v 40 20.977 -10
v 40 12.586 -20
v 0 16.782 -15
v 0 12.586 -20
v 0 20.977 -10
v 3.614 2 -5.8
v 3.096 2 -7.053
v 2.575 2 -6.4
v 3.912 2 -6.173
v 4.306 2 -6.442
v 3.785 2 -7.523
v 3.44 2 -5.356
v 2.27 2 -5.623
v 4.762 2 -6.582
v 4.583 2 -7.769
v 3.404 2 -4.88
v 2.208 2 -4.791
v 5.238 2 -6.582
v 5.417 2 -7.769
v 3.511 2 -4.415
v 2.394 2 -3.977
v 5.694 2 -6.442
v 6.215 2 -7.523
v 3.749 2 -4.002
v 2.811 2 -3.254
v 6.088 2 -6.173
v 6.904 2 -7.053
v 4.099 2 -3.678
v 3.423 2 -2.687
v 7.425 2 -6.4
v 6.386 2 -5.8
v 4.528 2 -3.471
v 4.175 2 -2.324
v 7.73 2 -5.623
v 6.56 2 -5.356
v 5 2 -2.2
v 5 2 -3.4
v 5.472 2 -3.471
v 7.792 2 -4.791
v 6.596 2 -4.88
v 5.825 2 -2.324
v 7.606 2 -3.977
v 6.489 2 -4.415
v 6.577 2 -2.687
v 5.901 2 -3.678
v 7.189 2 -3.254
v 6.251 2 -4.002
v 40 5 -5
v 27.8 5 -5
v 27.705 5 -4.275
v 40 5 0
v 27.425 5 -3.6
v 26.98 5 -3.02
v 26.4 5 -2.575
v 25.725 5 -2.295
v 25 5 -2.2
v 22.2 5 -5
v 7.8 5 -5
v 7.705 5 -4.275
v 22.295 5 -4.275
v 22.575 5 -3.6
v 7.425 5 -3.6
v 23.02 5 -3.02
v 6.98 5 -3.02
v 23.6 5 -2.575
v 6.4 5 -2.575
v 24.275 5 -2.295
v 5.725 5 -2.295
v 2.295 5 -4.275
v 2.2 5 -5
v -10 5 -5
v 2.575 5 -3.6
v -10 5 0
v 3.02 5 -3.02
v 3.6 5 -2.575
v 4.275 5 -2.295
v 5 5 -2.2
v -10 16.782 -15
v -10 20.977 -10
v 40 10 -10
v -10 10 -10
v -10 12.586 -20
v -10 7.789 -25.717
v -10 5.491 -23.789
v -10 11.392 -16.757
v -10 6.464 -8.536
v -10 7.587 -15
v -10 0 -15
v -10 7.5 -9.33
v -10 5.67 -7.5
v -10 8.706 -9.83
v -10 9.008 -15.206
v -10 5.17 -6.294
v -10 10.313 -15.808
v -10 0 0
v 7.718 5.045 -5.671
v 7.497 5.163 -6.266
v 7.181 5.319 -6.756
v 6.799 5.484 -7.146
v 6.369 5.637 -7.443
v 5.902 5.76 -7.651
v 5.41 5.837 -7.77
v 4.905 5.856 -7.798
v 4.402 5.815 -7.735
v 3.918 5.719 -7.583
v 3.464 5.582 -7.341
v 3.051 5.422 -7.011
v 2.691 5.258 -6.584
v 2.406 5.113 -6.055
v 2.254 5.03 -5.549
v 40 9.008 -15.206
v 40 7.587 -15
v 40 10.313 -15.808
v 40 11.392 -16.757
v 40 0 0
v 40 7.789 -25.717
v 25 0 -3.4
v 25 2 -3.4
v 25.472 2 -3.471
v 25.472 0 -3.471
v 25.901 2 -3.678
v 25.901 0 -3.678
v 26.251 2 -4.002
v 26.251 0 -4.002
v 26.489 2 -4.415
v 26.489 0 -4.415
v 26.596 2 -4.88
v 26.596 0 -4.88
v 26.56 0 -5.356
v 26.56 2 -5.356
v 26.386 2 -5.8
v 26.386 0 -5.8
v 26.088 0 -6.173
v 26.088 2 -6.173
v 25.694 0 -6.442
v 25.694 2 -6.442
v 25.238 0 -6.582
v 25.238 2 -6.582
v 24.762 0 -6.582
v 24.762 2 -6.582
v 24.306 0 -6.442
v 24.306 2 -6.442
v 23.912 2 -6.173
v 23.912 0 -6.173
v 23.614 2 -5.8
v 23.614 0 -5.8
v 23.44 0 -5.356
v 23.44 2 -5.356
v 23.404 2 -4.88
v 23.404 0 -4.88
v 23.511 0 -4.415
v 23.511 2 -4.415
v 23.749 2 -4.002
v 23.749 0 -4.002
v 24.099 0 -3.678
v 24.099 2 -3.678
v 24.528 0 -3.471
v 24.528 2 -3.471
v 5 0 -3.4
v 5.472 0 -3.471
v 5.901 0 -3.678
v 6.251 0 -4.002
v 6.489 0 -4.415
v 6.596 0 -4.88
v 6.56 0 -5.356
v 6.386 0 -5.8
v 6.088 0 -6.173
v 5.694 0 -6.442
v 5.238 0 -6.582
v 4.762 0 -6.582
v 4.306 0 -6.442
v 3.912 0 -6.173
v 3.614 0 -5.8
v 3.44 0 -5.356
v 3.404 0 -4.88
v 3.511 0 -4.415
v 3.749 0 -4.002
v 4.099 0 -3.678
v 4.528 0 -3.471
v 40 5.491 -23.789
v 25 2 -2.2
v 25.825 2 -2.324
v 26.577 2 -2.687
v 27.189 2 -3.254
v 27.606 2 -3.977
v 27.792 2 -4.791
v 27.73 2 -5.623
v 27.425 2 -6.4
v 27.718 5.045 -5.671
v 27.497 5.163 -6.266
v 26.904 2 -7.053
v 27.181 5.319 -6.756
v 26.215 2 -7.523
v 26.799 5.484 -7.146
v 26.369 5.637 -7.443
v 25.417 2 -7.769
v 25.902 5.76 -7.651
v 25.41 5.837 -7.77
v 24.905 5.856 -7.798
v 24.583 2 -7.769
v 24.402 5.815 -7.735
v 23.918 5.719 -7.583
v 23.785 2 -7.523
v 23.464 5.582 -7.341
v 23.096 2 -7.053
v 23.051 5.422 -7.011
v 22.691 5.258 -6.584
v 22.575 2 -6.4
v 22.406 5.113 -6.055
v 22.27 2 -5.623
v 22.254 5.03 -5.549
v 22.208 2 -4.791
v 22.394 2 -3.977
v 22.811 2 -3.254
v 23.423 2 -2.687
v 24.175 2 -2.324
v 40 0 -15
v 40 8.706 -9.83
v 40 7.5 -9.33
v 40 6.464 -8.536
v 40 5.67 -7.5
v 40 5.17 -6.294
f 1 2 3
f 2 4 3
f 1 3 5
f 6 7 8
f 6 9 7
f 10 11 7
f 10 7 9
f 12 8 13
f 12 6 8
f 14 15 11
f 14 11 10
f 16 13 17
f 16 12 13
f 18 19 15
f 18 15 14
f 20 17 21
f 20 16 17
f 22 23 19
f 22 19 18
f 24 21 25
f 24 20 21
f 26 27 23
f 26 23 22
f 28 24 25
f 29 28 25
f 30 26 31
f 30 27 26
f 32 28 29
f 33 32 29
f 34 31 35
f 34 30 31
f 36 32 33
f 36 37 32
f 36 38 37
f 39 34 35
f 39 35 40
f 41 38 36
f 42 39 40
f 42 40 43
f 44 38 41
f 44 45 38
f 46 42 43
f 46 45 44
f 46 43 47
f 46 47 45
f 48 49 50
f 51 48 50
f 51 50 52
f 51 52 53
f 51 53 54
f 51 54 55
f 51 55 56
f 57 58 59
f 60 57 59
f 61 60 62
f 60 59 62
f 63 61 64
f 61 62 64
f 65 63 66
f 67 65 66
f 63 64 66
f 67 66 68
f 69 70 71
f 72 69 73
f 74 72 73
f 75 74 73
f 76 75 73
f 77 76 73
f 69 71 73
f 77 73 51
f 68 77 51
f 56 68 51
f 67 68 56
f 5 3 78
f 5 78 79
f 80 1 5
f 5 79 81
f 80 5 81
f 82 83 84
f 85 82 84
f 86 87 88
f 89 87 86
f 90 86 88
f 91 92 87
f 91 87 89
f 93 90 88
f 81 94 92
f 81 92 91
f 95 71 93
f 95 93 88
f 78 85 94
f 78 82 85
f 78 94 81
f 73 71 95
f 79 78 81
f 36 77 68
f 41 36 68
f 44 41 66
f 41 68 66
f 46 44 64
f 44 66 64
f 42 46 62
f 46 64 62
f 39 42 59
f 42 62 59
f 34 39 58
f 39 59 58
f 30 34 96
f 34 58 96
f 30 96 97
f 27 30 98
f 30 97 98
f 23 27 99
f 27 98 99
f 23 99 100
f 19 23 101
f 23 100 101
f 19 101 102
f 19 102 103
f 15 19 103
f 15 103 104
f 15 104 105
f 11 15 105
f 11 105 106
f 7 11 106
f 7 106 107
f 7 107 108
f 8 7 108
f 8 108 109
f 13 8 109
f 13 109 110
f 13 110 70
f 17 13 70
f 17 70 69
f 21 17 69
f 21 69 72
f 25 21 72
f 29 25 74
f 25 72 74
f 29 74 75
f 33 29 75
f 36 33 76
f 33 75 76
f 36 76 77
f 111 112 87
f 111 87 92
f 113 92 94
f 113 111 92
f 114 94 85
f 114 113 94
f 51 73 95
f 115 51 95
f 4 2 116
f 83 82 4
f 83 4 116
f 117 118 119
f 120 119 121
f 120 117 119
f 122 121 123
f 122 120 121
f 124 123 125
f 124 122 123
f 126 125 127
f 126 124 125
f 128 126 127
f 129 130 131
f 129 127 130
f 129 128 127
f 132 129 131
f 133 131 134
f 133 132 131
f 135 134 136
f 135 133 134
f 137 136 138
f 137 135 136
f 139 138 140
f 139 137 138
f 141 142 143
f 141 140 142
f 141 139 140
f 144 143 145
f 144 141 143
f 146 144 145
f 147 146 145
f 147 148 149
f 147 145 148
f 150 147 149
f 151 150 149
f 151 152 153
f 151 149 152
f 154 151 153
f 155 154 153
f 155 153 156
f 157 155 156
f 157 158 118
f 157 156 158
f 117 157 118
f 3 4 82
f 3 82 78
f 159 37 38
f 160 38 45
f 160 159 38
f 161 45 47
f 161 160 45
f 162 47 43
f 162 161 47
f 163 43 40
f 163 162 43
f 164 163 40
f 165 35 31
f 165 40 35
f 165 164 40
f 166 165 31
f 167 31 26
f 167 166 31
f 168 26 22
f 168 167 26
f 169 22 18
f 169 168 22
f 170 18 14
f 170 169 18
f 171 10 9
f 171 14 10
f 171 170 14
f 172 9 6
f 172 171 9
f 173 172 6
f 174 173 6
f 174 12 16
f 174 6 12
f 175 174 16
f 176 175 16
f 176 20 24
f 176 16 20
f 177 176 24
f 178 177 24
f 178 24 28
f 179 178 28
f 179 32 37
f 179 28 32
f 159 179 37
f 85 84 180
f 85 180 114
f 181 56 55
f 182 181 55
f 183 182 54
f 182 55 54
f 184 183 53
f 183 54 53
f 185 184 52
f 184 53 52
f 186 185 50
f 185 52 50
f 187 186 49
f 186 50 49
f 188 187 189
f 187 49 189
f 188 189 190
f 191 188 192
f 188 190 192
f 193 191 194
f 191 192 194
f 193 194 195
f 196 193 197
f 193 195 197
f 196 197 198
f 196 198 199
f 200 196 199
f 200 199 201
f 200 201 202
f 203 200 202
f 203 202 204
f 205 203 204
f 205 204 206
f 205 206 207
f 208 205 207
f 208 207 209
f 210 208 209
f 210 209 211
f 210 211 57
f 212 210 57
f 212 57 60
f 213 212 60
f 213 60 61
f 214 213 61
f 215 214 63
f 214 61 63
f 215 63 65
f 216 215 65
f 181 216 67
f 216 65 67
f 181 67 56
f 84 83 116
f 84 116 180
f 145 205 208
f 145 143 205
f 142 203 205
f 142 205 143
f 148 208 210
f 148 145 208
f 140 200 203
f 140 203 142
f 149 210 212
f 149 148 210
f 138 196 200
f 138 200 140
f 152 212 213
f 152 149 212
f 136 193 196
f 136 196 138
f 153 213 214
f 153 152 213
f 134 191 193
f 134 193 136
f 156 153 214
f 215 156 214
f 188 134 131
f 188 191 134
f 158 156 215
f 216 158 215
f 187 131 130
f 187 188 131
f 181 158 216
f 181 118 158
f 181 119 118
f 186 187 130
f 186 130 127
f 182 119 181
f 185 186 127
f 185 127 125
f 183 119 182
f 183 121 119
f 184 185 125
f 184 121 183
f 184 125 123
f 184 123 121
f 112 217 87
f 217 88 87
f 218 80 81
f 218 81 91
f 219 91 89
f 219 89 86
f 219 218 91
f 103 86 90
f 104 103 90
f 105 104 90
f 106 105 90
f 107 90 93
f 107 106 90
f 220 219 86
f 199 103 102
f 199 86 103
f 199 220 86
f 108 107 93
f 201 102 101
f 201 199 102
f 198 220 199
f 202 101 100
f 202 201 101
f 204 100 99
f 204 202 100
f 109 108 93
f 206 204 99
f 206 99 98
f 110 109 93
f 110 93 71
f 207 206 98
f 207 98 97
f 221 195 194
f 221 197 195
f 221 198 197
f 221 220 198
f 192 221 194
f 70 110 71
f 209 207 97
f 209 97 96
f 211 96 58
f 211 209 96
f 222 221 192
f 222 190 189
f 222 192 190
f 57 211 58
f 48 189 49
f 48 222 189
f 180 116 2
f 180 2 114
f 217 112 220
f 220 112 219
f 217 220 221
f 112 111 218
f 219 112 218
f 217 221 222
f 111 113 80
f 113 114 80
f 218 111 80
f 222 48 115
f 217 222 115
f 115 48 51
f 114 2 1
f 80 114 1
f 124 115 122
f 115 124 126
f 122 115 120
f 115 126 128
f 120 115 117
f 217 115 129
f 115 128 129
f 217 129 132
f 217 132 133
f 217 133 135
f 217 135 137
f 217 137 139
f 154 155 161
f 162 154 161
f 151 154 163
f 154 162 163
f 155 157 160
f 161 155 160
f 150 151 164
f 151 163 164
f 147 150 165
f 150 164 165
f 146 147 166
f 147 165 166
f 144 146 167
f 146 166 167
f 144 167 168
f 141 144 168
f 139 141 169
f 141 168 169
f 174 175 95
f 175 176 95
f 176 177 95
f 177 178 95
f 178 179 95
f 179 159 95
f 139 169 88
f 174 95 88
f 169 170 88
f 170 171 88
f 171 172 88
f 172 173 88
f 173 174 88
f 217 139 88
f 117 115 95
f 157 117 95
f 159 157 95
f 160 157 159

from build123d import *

# Parameters (mm, degrees)
CROQUIS1_W              = 30
CROQUIS1_H              = 10
CROQUIS1_R              = 1.6
SALIENTE_EXTRUIR1_DEPTH = 5
CROQUIS2_R              = 2.8
CORTAR_EXTRUIR1_DEPTH   = 3
SALIENTE_EXTRUIR5_DEPTH = 10
SALIENTE_EXTRUIR6_DEPTH = 30
SALIENTE_EXTRUIR7_DEPTH = 10
REDONDEO1_R             = 5
REDONDEO2_R             = 5
SALIENTE_EXTRUIR8_DEPTH = 50


# Some blends are built 0.0001 mm under size
with BuildPart() as part:
    # Croquis1 → Saliente-Extruir1 (new body)
    with BuildSketch(Plane(origin=(0, 0, 0), x_dir=(1, 0, 0), z_dir=(0, 1, 0))):
        with Locations((15, 5)):
            Rectangle(CROQUIS1_W, CROQUIS1_H)
        with Locations(Location((5, 5, 0), (0, 0, 270))):
            Circle(CROQUIS1_R, mode=Mode.SUBTRACT)
        with Locations(Location((25, 5, 0), (0, 0, 270))):
            Circle(CROQUIS1_R, mode=Mode.SUBTRACT)
    extrude(amount=SALIENTE_EXTRUIR1_DEPTH)

    # Croquis2 → Cortar-Extruir1 (cut)
    with BuildSketch(Plane(origin=(0, 5, 0), x_dir=(1, 0, 0), z_dir=(0, 1, 0))):
        with Locations(Location((5, 5, 0), (0, 0, 270))):
            Circle(CROQUIS2_R)
        with Locations(Location((25, 5, 0), (0, 0, 270))):
            Circle(CROQUIS2_R)
    extrude(amount=-CORTAR_EXTRUIR1_DEPTH, mode=Mode.SUBTRACT)

    # Croquis6 → Saliente-Extruir5 (add)
    with BuildSketch(Plane.ZY):
        Polygon((-15, 16.781992624), (-10, 20.977490779), (-10, 16.781992624), (-10, 5), (0, 5), (0, 0), (-10, 0), (-15, 0), (-15, 12.586494468), (-20, 12.586494468), align=None)
    extrude(amount=SALIENTE_EXTRUIR5_DEPTH)

    # Croquis7 → Saliente-Extruir6 (add)
    with BuildSketch(Plane(origin=(0, 0, 0), x_dir=(0, 0, -1), z_dir=(1, 0, 0))):
        Polygon((10, 20.977490779), (10, 5), (10, 0), (15, 0), (15, 12.586494468), (20, 12.586494468), align=None)
    extrude(amount=SALIENTE_EXTRUIR6_DEPTH)

    # Croquis8 → Saliente-Extruir7 (add)
    with BuildSketch(Plane(origin=(30, 0, 0), x_dir=(0, 0, -1), z_dir=(1, 0, 0))):
        Polygon((0, 0), (15, 0), (15, 12.586494468), (20, 12.586494468), (10, 20.977490779), (10, 5), (0, 5), align=None)
    extrude(amount=SALIENTE_EXTRUIR7_DEPTH)

    # Redondeo1
    # the kernel refuses this fillet: 5 mm, written as the material it adds along each edge
    with BuildSketch(Plane(origin=(40, 5, -10), x_dir=(0, 1, 0), z_dir=(-1, 0, 0))) as redondeo1_piece_1_section:
        with BuildLine():
            CenterArc((REDONDEO1_R, -REDONDEO1_R), REDONDEO1_R, 90, 90)
            Line((0, -REDONDEO1_R), (0, 0))
            Line((0, 0), (REDONDEO1_R, 0))
        make_face()
    redondeo1_piece_1 = extrude(amount=50, mode=Mode.PRIVATE)
    redondeo1_piece_1 = redondeo1_piece_1 - Plane(origin=(5, 6.156265405, -5), x_dir=(0, 0, 1), z_dir=(0, 1, 0)) * Cylinder(2.8, 120, mode=Mode.PRIVATE)
    redondeo1_piece_1 = redondeo1_piece_1 - Plane(origin=(25, 6.156265405, -5), x_dir=(0, 0, 1), z_dir=(0, 1, 0)) * Cylinder(2.8, 120, mode=Mode.PRIVATE)
    add(redondeo1_piece_1)

    # Redondeo2
    redondeo2_edges = [part.edges().sort_by_distance(p)[0] for p in [
        (15, 12.586494468, -15),
    ]]
    fillet(redondeo2_edges, radius=REDONDEO2_R - 0.0001)  # a hair under: the kernel refuses the full size

    # Croquis9 → Saliente-Extruir8 (add)
    with BuildSketch(Plane.ZY.offset(10)):
        Polygon((-20, 12.586494468), (-25.717162805, 7.789225266), (-23.788799976, 5.491091937), (-10, 17.061268911), (-10, 20.977490779), align=None)
    extrude(amount=-SALIENTE_EXTRUIR8_DEPTH)


solid = part.part
